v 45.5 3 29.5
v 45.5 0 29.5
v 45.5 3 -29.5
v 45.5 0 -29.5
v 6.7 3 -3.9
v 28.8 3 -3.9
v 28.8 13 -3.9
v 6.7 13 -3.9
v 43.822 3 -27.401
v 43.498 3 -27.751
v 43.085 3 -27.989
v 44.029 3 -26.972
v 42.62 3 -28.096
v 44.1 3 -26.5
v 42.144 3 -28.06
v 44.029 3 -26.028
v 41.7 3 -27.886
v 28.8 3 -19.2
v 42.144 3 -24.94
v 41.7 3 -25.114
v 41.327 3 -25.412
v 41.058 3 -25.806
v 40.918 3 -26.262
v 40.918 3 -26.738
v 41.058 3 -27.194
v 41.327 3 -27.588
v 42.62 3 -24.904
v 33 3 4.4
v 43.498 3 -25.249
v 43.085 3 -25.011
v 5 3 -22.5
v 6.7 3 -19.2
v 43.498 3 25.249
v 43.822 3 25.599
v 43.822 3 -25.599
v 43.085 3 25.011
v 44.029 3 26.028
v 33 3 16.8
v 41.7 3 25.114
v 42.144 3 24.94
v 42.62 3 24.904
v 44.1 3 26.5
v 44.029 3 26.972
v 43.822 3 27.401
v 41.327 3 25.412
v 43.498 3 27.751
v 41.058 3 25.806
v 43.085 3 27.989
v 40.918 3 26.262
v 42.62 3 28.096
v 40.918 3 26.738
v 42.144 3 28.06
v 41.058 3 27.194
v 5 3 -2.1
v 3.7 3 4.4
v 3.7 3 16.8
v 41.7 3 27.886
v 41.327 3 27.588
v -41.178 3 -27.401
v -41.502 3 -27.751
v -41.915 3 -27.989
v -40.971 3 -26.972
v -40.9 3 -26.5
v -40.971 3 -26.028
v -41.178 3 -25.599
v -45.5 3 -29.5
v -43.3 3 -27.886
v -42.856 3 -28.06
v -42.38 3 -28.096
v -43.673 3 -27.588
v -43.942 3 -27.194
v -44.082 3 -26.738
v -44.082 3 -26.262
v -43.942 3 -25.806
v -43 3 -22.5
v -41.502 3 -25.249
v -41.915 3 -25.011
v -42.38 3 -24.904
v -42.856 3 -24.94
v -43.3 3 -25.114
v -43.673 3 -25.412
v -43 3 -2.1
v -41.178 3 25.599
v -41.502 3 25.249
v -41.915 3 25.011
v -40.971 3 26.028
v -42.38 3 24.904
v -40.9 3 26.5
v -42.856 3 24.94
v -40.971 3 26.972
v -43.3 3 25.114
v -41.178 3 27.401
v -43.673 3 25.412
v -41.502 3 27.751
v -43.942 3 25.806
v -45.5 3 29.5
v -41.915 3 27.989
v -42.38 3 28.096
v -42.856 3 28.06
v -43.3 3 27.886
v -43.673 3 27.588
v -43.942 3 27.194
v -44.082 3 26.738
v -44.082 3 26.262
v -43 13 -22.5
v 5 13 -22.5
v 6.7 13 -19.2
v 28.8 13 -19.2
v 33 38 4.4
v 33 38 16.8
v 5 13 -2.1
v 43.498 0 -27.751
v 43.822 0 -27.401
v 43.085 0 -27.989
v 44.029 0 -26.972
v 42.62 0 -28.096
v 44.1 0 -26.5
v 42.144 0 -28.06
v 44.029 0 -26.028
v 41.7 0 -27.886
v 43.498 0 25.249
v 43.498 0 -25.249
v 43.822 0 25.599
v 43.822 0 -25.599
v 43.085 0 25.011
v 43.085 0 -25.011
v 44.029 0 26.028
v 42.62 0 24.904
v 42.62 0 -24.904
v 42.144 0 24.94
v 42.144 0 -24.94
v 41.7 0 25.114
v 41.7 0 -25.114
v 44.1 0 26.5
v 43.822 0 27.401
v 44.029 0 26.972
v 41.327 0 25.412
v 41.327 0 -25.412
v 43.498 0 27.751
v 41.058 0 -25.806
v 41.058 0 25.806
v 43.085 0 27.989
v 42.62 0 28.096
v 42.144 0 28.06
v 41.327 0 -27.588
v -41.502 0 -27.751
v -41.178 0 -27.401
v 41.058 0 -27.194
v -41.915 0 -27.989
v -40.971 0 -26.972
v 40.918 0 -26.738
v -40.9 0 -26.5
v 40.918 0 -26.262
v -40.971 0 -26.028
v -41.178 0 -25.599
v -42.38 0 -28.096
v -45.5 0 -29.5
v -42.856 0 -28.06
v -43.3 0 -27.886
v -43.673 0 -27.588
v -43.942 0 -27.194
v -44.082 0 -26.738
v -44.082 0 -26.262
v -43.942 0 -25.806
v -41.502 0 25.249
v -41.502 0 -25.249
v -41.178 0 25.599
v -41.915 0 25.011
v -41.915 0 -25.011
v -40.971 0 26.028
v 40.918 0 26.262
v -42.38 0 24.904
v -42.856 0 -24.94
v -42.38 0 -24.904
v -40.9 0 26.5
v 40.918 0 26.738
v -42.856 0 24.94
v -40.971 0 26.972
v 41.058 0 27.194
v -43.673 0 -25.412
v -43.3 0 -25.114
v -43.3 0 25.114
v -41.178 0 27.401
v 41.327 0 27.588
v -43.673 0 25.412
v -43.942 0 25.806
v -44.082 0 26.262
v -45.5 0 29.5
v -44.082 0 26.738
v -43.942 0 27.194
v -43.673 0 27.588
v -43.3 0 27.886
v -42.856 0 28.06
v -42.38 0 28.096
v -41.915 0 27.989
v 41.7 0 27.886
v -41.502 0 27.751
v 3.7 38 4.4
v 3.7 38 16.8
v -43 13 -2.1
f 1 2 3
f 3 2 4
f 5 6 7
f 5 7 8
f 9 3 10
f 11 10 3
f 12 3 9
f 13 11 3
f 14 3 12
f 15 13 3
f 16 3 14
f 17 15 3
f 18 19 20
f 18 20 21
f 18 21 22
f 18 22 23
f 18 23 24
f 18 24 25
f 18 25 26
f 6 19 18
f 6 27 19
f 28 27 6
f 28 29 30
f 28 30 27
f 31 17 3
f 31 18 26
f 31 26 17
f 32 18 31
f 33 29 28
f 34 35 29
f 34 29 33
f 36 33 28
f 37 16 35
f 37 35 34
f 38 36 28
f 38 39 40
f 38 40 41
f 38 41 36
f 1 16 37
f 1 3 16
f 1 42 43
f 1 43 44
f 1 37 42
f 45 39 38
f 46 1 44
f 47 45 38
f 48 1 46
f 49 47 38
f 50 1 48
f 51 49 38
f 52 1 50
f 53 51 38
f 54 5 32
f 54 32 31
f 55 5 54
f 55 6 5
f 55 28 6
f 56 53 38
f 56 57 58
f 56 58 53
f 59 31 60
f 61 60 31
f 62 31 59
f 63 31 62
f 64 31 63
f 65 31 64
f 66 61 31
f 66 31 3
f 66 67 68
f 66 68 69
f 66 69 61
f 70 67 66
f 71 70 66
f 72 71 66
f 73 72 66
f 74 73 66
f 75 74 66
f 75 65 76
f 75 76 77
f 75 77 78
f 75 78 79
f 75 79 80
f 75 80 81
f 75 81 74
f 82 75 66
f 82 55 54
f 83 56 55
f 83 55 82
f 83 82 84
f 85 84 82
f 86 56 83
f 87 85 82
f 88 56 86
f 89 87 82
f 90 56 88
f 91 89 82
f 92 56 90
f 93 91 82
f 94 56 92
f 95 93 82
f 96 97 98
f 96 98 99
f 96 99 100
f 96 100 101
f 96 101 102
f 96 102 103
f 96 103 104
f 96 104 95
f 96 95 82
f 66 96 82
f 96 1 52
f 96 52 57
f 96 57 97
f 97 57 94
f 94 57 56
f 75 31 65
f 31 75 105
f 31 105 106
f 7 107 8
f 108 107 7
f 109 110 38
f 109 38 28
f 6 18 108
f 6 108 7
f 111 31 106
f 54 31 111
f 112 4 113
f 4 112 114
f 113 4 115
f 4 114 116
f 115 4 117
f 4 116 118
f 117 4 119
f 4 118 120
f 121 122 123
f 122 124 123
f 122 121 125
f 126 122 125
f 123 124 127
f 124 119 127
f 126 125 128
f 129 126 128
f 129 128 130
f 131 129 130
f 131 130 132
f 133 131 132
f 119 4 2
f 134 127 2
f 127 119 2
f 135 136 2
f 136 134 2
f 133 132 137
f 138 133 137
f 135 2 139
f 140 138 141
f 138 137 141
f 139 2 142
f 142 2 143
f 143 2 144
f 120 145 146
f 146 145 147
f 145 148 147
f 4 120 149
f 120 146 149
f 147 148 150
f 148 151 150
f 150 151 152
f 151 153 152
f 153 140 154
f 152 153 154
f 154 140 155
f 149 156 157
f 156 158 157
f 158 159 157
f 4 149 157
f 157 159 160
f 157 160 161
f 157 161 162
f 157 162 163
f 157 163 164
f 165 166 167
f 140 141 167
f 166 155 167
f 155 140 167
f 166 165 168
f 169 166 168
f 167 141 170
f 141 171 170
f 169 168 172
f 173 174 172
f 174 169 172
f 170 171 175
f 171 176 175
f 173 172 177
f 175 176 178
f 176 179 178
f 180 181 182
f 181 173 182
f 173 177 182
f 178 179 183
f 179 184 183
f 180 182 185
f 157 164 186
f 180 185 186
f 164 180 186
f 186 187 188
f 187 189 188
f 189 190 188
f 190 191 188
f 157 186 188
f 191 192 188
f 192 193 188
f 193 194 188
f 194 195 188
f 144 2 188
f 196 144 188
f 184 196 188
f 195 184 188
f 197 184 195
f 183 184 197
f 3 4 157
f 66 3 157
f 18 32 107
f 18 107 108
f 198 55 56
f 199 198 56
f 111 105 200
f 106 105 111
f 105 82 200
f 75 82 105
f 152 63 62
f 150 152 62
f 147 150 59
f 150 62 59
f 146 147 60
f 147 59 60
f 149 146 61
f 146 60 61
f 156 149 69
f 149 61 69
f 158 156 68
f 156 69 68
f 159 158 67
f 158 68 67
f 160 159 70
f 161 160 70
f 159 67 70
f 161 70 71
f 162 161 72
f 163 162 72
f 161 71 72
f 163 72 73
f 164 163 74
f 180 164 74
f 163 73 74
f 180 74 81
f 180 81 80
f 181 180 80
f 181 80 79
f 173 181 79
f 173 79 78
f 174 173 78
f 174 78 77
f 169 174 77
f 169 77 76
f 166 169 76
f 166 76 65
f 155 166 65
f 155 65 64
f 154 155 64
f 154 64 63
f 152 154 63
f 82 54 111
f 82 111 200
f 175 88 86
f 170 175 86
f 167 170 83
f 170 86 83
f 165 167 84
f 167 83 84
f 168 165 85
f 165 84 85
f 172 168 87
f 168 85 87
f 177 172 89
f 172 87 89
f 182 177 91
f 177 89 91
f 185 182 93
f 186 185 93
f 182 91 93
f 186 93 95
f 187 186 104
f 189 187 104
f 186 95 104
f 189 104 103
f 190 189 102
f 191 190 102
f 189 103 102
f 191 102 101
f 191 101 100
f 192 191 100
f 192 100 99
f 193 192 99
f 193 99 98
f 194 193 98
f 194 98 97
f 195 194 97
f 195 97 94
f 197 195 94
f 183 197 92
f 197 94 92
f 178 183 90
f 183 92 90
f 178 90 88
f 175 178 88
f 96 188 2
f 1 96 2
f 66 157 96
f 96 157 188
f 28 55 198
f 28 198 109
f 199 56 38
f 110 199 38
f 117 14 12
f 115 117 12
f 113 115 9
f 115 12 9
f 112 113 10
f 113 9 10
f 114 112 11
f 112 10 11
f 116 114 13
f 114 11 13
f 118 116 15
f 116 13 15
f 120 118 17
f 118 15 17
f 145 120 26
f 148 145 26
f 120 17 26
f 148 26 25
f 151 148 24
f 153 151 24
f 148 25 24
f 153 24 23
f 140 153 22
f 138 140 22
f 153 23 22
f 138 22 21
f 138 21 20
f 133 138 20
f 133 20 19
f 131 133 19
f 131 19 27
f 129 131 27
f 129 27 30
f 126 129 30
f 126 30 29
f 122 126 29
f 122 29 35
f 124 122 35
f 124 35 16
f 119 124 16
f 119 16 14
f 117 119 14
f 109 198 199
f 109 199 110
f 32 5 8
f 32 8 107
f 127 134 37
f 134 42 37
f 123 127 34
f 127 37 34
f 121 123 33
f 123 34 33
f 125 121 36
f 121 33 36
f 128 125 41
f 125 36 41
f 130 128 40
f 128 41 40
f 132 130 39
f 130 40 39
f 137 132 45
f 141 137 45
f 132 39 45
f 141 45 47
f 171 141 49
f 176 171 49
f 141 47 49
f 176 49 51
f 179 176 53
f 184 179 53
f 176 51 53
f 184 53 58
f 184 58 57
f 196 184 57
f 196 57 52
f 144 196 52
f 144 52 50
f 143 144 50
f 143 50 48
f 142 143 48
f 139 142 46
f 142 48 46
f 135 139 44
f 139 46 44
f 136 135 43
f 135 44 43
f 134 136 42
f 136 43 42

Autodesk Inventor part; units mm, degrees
ref_plane "YZ Plane" through (0, 0, 0) normal (1, 0, 0) x (0, 1, 0)
ref_plane "XZ Plane" through (0, 0, 0) normal (0, 1, 0) x (-1, 0, 0)
ref_plane "XY Plane" through (0, 0, 0) normal (0, 0, 1) x (1, 0, 0)
sketch "Sketch1" plane through (0, 0, 0) normal (0, 1, 0) x (-1, 0, 0)
  line L0 (-45.5, -29.5) -> (45.5, -29.5)
  line L1 (45.5, -29.5) -> (45.5, 29.5)
  line L2 (45.5, 29.5) -> (-45.5, 29.5)
  line L3 (-45.5, 29.5) -> (-45.5, -29.5)
  line L4 (-45.5, -29.5) -> (45.5, 29.5) construction
  line L5 (45.5, -29.5) -> (-45.5, 29.5) construction
  point P0 (0, 0)
  dimension "d0" = 91
  dimension "d1" = 59
extrude "Extrusion1" add sketch "Sketch1" along normal blind 3
sketch "Sketch2" plane through (0, 3, 0) normal (0, 1, 0) x (1, 0, 0)
  line L0 (45.5, 29.5) -> (-45.5, 29.5) projected
  line L1 (-45.5, 29.5) -> (-43, 29.5)
  line L2 (-43, 29.5) -> (-43, 22.5)
  line L3 (-43, 22.5) -> (-45.5, 22.5)
  line L4 (-45.5, 22.5) -> (-45.5, 29.5)
  line L5 (-43, 22.5) -> (5, 22.5)
  line L6 (5, 22.5) -> (5, 2.1)
  line L7 (5, 2.1) -> (-43, 2.1)
  line L8 (-43, 2.1) -> (-43, 22.5)
  line L9 (6.7, 19.2) -> (28.8, 19.2)
  line L10 (28.8, 19.2) -> (28.8, 3.9)
  line L11 (28.8, 3.9) -> (6.7, 3.9)
  line L12 (6.7, 3.9) -> (6.7, 19.2)
  line L13 (6.7, 19.2) -> (28.8, 3.9) construction
  line L14 (28.8, 19.2) -> (6.7, 3.9) construction
  line L15 (3.7, -4.4) -> (33, -4.4)
  line L16 (33, -4.4) -> (33, -16.8)
  line L17 (33, -16.8) -> (3.7, -16.8)
  line L18 (3.7, -16.8) -> (3.7, -4.4)
  line L19 (3.7, -4.4) -> (33, -16.8) construction
  line L20 (33, -4.4) -> (3.7, -16.8) construction
  line L21 (45.5, -29.5) -> (45.5, 29.5) projected
  line L22 (-45.5, -29.5) -> (45.5, -29.5) projected
  point P0 (0, 0)
  point P1 (17.75, 11.55)
  point P2 (18.35, -10.6)
  dimension "d4" = 2.5
  dimension "d5" = 7
  dimension "d6" = 48
  dimension "d7" = 20.4
  dimension "d10" = 1.7
  dimension "d11" = 22.1
  dimension "d12" = 15.3
  dimension "d13" = 3.3
  dimension "d14" = 12.4
  dimension "d15" = 29.3
  dimension "d16" = 12.5
  dimension "d17" = 12.7
extrude "Extrusion2" add sketch "Sketch2" along normal blind 10 contours L5 L6 L7 L8 | L9 L10 L11 L12 | L15 L16 L17 L18
sketch "Sketch3" plane through (0, 3, 0) normal (0, 1, 0) x (1, 0, 0)
  line L0 (-42.5, 26.5) -> (42.5, 26.5)
  line L1 (42.5, 26.5) -> (42.5, -26.5)
  line L2 (42.5, -26.5) -> (-42.5, -26.5)
  line L3 (-42.5, -26.5) -> (-42.5, 26.5)
  line L4 (-42.5, 26.5) -> (42.5, -26.5) construction
  line L5 (42.5, 26.5) -> (-42.5, -26.5) construction
  circle A0 centre (42.5, -26.5) radius 1.6
  circle A1 centre (-42.5, -26.5) radius 1.6
  circle A2 centre (-42.5, 26.5) radius 1.6
  circle A3 centre (42.5, 26.5) radius 1.6
  point P0 (0, 0)
  dimension "d18" = 85
  dimension "d19" = 53
  dimension "d20" = 3.2
  dimension "d21" = 3.2
  dimension "d22" = 3.2
  dimension "d23" = 3.2
extrude "Extrusion3" cut sketch "Sketch3" against normal blind 3 contours L3 A2 L0 | L0 A2 L3 | A3 L1 L0 | L0 L1 A3 | A1 L2 L3 | L3 L2 A1 | A0 L2 L1 | L1 L2 A0
sketch "Sketch4" plane through (0, 13, 0) normal (0, 1, 0) x (1, 0, 0)
  line L0 (3.7, -4.4) -> (3.7, -16.8) projected
  line L1 (3.7, -4.4) -> (33, -4.4) projected
  line L2 (3.7, -16.8) -> (33, -16.8)
  line L3 (33, -16.8) -> (33, -4.4)
  line L4 (33, -4.4) -> (3.7, -4.4)
  line L5 (3.7, -4.4) -> (3.7, -16.8)
  point P0 (0, 0)
extrude "Extrusion4" add sketch "Sketch4" along normal blind 25
properties part number "PCB"
